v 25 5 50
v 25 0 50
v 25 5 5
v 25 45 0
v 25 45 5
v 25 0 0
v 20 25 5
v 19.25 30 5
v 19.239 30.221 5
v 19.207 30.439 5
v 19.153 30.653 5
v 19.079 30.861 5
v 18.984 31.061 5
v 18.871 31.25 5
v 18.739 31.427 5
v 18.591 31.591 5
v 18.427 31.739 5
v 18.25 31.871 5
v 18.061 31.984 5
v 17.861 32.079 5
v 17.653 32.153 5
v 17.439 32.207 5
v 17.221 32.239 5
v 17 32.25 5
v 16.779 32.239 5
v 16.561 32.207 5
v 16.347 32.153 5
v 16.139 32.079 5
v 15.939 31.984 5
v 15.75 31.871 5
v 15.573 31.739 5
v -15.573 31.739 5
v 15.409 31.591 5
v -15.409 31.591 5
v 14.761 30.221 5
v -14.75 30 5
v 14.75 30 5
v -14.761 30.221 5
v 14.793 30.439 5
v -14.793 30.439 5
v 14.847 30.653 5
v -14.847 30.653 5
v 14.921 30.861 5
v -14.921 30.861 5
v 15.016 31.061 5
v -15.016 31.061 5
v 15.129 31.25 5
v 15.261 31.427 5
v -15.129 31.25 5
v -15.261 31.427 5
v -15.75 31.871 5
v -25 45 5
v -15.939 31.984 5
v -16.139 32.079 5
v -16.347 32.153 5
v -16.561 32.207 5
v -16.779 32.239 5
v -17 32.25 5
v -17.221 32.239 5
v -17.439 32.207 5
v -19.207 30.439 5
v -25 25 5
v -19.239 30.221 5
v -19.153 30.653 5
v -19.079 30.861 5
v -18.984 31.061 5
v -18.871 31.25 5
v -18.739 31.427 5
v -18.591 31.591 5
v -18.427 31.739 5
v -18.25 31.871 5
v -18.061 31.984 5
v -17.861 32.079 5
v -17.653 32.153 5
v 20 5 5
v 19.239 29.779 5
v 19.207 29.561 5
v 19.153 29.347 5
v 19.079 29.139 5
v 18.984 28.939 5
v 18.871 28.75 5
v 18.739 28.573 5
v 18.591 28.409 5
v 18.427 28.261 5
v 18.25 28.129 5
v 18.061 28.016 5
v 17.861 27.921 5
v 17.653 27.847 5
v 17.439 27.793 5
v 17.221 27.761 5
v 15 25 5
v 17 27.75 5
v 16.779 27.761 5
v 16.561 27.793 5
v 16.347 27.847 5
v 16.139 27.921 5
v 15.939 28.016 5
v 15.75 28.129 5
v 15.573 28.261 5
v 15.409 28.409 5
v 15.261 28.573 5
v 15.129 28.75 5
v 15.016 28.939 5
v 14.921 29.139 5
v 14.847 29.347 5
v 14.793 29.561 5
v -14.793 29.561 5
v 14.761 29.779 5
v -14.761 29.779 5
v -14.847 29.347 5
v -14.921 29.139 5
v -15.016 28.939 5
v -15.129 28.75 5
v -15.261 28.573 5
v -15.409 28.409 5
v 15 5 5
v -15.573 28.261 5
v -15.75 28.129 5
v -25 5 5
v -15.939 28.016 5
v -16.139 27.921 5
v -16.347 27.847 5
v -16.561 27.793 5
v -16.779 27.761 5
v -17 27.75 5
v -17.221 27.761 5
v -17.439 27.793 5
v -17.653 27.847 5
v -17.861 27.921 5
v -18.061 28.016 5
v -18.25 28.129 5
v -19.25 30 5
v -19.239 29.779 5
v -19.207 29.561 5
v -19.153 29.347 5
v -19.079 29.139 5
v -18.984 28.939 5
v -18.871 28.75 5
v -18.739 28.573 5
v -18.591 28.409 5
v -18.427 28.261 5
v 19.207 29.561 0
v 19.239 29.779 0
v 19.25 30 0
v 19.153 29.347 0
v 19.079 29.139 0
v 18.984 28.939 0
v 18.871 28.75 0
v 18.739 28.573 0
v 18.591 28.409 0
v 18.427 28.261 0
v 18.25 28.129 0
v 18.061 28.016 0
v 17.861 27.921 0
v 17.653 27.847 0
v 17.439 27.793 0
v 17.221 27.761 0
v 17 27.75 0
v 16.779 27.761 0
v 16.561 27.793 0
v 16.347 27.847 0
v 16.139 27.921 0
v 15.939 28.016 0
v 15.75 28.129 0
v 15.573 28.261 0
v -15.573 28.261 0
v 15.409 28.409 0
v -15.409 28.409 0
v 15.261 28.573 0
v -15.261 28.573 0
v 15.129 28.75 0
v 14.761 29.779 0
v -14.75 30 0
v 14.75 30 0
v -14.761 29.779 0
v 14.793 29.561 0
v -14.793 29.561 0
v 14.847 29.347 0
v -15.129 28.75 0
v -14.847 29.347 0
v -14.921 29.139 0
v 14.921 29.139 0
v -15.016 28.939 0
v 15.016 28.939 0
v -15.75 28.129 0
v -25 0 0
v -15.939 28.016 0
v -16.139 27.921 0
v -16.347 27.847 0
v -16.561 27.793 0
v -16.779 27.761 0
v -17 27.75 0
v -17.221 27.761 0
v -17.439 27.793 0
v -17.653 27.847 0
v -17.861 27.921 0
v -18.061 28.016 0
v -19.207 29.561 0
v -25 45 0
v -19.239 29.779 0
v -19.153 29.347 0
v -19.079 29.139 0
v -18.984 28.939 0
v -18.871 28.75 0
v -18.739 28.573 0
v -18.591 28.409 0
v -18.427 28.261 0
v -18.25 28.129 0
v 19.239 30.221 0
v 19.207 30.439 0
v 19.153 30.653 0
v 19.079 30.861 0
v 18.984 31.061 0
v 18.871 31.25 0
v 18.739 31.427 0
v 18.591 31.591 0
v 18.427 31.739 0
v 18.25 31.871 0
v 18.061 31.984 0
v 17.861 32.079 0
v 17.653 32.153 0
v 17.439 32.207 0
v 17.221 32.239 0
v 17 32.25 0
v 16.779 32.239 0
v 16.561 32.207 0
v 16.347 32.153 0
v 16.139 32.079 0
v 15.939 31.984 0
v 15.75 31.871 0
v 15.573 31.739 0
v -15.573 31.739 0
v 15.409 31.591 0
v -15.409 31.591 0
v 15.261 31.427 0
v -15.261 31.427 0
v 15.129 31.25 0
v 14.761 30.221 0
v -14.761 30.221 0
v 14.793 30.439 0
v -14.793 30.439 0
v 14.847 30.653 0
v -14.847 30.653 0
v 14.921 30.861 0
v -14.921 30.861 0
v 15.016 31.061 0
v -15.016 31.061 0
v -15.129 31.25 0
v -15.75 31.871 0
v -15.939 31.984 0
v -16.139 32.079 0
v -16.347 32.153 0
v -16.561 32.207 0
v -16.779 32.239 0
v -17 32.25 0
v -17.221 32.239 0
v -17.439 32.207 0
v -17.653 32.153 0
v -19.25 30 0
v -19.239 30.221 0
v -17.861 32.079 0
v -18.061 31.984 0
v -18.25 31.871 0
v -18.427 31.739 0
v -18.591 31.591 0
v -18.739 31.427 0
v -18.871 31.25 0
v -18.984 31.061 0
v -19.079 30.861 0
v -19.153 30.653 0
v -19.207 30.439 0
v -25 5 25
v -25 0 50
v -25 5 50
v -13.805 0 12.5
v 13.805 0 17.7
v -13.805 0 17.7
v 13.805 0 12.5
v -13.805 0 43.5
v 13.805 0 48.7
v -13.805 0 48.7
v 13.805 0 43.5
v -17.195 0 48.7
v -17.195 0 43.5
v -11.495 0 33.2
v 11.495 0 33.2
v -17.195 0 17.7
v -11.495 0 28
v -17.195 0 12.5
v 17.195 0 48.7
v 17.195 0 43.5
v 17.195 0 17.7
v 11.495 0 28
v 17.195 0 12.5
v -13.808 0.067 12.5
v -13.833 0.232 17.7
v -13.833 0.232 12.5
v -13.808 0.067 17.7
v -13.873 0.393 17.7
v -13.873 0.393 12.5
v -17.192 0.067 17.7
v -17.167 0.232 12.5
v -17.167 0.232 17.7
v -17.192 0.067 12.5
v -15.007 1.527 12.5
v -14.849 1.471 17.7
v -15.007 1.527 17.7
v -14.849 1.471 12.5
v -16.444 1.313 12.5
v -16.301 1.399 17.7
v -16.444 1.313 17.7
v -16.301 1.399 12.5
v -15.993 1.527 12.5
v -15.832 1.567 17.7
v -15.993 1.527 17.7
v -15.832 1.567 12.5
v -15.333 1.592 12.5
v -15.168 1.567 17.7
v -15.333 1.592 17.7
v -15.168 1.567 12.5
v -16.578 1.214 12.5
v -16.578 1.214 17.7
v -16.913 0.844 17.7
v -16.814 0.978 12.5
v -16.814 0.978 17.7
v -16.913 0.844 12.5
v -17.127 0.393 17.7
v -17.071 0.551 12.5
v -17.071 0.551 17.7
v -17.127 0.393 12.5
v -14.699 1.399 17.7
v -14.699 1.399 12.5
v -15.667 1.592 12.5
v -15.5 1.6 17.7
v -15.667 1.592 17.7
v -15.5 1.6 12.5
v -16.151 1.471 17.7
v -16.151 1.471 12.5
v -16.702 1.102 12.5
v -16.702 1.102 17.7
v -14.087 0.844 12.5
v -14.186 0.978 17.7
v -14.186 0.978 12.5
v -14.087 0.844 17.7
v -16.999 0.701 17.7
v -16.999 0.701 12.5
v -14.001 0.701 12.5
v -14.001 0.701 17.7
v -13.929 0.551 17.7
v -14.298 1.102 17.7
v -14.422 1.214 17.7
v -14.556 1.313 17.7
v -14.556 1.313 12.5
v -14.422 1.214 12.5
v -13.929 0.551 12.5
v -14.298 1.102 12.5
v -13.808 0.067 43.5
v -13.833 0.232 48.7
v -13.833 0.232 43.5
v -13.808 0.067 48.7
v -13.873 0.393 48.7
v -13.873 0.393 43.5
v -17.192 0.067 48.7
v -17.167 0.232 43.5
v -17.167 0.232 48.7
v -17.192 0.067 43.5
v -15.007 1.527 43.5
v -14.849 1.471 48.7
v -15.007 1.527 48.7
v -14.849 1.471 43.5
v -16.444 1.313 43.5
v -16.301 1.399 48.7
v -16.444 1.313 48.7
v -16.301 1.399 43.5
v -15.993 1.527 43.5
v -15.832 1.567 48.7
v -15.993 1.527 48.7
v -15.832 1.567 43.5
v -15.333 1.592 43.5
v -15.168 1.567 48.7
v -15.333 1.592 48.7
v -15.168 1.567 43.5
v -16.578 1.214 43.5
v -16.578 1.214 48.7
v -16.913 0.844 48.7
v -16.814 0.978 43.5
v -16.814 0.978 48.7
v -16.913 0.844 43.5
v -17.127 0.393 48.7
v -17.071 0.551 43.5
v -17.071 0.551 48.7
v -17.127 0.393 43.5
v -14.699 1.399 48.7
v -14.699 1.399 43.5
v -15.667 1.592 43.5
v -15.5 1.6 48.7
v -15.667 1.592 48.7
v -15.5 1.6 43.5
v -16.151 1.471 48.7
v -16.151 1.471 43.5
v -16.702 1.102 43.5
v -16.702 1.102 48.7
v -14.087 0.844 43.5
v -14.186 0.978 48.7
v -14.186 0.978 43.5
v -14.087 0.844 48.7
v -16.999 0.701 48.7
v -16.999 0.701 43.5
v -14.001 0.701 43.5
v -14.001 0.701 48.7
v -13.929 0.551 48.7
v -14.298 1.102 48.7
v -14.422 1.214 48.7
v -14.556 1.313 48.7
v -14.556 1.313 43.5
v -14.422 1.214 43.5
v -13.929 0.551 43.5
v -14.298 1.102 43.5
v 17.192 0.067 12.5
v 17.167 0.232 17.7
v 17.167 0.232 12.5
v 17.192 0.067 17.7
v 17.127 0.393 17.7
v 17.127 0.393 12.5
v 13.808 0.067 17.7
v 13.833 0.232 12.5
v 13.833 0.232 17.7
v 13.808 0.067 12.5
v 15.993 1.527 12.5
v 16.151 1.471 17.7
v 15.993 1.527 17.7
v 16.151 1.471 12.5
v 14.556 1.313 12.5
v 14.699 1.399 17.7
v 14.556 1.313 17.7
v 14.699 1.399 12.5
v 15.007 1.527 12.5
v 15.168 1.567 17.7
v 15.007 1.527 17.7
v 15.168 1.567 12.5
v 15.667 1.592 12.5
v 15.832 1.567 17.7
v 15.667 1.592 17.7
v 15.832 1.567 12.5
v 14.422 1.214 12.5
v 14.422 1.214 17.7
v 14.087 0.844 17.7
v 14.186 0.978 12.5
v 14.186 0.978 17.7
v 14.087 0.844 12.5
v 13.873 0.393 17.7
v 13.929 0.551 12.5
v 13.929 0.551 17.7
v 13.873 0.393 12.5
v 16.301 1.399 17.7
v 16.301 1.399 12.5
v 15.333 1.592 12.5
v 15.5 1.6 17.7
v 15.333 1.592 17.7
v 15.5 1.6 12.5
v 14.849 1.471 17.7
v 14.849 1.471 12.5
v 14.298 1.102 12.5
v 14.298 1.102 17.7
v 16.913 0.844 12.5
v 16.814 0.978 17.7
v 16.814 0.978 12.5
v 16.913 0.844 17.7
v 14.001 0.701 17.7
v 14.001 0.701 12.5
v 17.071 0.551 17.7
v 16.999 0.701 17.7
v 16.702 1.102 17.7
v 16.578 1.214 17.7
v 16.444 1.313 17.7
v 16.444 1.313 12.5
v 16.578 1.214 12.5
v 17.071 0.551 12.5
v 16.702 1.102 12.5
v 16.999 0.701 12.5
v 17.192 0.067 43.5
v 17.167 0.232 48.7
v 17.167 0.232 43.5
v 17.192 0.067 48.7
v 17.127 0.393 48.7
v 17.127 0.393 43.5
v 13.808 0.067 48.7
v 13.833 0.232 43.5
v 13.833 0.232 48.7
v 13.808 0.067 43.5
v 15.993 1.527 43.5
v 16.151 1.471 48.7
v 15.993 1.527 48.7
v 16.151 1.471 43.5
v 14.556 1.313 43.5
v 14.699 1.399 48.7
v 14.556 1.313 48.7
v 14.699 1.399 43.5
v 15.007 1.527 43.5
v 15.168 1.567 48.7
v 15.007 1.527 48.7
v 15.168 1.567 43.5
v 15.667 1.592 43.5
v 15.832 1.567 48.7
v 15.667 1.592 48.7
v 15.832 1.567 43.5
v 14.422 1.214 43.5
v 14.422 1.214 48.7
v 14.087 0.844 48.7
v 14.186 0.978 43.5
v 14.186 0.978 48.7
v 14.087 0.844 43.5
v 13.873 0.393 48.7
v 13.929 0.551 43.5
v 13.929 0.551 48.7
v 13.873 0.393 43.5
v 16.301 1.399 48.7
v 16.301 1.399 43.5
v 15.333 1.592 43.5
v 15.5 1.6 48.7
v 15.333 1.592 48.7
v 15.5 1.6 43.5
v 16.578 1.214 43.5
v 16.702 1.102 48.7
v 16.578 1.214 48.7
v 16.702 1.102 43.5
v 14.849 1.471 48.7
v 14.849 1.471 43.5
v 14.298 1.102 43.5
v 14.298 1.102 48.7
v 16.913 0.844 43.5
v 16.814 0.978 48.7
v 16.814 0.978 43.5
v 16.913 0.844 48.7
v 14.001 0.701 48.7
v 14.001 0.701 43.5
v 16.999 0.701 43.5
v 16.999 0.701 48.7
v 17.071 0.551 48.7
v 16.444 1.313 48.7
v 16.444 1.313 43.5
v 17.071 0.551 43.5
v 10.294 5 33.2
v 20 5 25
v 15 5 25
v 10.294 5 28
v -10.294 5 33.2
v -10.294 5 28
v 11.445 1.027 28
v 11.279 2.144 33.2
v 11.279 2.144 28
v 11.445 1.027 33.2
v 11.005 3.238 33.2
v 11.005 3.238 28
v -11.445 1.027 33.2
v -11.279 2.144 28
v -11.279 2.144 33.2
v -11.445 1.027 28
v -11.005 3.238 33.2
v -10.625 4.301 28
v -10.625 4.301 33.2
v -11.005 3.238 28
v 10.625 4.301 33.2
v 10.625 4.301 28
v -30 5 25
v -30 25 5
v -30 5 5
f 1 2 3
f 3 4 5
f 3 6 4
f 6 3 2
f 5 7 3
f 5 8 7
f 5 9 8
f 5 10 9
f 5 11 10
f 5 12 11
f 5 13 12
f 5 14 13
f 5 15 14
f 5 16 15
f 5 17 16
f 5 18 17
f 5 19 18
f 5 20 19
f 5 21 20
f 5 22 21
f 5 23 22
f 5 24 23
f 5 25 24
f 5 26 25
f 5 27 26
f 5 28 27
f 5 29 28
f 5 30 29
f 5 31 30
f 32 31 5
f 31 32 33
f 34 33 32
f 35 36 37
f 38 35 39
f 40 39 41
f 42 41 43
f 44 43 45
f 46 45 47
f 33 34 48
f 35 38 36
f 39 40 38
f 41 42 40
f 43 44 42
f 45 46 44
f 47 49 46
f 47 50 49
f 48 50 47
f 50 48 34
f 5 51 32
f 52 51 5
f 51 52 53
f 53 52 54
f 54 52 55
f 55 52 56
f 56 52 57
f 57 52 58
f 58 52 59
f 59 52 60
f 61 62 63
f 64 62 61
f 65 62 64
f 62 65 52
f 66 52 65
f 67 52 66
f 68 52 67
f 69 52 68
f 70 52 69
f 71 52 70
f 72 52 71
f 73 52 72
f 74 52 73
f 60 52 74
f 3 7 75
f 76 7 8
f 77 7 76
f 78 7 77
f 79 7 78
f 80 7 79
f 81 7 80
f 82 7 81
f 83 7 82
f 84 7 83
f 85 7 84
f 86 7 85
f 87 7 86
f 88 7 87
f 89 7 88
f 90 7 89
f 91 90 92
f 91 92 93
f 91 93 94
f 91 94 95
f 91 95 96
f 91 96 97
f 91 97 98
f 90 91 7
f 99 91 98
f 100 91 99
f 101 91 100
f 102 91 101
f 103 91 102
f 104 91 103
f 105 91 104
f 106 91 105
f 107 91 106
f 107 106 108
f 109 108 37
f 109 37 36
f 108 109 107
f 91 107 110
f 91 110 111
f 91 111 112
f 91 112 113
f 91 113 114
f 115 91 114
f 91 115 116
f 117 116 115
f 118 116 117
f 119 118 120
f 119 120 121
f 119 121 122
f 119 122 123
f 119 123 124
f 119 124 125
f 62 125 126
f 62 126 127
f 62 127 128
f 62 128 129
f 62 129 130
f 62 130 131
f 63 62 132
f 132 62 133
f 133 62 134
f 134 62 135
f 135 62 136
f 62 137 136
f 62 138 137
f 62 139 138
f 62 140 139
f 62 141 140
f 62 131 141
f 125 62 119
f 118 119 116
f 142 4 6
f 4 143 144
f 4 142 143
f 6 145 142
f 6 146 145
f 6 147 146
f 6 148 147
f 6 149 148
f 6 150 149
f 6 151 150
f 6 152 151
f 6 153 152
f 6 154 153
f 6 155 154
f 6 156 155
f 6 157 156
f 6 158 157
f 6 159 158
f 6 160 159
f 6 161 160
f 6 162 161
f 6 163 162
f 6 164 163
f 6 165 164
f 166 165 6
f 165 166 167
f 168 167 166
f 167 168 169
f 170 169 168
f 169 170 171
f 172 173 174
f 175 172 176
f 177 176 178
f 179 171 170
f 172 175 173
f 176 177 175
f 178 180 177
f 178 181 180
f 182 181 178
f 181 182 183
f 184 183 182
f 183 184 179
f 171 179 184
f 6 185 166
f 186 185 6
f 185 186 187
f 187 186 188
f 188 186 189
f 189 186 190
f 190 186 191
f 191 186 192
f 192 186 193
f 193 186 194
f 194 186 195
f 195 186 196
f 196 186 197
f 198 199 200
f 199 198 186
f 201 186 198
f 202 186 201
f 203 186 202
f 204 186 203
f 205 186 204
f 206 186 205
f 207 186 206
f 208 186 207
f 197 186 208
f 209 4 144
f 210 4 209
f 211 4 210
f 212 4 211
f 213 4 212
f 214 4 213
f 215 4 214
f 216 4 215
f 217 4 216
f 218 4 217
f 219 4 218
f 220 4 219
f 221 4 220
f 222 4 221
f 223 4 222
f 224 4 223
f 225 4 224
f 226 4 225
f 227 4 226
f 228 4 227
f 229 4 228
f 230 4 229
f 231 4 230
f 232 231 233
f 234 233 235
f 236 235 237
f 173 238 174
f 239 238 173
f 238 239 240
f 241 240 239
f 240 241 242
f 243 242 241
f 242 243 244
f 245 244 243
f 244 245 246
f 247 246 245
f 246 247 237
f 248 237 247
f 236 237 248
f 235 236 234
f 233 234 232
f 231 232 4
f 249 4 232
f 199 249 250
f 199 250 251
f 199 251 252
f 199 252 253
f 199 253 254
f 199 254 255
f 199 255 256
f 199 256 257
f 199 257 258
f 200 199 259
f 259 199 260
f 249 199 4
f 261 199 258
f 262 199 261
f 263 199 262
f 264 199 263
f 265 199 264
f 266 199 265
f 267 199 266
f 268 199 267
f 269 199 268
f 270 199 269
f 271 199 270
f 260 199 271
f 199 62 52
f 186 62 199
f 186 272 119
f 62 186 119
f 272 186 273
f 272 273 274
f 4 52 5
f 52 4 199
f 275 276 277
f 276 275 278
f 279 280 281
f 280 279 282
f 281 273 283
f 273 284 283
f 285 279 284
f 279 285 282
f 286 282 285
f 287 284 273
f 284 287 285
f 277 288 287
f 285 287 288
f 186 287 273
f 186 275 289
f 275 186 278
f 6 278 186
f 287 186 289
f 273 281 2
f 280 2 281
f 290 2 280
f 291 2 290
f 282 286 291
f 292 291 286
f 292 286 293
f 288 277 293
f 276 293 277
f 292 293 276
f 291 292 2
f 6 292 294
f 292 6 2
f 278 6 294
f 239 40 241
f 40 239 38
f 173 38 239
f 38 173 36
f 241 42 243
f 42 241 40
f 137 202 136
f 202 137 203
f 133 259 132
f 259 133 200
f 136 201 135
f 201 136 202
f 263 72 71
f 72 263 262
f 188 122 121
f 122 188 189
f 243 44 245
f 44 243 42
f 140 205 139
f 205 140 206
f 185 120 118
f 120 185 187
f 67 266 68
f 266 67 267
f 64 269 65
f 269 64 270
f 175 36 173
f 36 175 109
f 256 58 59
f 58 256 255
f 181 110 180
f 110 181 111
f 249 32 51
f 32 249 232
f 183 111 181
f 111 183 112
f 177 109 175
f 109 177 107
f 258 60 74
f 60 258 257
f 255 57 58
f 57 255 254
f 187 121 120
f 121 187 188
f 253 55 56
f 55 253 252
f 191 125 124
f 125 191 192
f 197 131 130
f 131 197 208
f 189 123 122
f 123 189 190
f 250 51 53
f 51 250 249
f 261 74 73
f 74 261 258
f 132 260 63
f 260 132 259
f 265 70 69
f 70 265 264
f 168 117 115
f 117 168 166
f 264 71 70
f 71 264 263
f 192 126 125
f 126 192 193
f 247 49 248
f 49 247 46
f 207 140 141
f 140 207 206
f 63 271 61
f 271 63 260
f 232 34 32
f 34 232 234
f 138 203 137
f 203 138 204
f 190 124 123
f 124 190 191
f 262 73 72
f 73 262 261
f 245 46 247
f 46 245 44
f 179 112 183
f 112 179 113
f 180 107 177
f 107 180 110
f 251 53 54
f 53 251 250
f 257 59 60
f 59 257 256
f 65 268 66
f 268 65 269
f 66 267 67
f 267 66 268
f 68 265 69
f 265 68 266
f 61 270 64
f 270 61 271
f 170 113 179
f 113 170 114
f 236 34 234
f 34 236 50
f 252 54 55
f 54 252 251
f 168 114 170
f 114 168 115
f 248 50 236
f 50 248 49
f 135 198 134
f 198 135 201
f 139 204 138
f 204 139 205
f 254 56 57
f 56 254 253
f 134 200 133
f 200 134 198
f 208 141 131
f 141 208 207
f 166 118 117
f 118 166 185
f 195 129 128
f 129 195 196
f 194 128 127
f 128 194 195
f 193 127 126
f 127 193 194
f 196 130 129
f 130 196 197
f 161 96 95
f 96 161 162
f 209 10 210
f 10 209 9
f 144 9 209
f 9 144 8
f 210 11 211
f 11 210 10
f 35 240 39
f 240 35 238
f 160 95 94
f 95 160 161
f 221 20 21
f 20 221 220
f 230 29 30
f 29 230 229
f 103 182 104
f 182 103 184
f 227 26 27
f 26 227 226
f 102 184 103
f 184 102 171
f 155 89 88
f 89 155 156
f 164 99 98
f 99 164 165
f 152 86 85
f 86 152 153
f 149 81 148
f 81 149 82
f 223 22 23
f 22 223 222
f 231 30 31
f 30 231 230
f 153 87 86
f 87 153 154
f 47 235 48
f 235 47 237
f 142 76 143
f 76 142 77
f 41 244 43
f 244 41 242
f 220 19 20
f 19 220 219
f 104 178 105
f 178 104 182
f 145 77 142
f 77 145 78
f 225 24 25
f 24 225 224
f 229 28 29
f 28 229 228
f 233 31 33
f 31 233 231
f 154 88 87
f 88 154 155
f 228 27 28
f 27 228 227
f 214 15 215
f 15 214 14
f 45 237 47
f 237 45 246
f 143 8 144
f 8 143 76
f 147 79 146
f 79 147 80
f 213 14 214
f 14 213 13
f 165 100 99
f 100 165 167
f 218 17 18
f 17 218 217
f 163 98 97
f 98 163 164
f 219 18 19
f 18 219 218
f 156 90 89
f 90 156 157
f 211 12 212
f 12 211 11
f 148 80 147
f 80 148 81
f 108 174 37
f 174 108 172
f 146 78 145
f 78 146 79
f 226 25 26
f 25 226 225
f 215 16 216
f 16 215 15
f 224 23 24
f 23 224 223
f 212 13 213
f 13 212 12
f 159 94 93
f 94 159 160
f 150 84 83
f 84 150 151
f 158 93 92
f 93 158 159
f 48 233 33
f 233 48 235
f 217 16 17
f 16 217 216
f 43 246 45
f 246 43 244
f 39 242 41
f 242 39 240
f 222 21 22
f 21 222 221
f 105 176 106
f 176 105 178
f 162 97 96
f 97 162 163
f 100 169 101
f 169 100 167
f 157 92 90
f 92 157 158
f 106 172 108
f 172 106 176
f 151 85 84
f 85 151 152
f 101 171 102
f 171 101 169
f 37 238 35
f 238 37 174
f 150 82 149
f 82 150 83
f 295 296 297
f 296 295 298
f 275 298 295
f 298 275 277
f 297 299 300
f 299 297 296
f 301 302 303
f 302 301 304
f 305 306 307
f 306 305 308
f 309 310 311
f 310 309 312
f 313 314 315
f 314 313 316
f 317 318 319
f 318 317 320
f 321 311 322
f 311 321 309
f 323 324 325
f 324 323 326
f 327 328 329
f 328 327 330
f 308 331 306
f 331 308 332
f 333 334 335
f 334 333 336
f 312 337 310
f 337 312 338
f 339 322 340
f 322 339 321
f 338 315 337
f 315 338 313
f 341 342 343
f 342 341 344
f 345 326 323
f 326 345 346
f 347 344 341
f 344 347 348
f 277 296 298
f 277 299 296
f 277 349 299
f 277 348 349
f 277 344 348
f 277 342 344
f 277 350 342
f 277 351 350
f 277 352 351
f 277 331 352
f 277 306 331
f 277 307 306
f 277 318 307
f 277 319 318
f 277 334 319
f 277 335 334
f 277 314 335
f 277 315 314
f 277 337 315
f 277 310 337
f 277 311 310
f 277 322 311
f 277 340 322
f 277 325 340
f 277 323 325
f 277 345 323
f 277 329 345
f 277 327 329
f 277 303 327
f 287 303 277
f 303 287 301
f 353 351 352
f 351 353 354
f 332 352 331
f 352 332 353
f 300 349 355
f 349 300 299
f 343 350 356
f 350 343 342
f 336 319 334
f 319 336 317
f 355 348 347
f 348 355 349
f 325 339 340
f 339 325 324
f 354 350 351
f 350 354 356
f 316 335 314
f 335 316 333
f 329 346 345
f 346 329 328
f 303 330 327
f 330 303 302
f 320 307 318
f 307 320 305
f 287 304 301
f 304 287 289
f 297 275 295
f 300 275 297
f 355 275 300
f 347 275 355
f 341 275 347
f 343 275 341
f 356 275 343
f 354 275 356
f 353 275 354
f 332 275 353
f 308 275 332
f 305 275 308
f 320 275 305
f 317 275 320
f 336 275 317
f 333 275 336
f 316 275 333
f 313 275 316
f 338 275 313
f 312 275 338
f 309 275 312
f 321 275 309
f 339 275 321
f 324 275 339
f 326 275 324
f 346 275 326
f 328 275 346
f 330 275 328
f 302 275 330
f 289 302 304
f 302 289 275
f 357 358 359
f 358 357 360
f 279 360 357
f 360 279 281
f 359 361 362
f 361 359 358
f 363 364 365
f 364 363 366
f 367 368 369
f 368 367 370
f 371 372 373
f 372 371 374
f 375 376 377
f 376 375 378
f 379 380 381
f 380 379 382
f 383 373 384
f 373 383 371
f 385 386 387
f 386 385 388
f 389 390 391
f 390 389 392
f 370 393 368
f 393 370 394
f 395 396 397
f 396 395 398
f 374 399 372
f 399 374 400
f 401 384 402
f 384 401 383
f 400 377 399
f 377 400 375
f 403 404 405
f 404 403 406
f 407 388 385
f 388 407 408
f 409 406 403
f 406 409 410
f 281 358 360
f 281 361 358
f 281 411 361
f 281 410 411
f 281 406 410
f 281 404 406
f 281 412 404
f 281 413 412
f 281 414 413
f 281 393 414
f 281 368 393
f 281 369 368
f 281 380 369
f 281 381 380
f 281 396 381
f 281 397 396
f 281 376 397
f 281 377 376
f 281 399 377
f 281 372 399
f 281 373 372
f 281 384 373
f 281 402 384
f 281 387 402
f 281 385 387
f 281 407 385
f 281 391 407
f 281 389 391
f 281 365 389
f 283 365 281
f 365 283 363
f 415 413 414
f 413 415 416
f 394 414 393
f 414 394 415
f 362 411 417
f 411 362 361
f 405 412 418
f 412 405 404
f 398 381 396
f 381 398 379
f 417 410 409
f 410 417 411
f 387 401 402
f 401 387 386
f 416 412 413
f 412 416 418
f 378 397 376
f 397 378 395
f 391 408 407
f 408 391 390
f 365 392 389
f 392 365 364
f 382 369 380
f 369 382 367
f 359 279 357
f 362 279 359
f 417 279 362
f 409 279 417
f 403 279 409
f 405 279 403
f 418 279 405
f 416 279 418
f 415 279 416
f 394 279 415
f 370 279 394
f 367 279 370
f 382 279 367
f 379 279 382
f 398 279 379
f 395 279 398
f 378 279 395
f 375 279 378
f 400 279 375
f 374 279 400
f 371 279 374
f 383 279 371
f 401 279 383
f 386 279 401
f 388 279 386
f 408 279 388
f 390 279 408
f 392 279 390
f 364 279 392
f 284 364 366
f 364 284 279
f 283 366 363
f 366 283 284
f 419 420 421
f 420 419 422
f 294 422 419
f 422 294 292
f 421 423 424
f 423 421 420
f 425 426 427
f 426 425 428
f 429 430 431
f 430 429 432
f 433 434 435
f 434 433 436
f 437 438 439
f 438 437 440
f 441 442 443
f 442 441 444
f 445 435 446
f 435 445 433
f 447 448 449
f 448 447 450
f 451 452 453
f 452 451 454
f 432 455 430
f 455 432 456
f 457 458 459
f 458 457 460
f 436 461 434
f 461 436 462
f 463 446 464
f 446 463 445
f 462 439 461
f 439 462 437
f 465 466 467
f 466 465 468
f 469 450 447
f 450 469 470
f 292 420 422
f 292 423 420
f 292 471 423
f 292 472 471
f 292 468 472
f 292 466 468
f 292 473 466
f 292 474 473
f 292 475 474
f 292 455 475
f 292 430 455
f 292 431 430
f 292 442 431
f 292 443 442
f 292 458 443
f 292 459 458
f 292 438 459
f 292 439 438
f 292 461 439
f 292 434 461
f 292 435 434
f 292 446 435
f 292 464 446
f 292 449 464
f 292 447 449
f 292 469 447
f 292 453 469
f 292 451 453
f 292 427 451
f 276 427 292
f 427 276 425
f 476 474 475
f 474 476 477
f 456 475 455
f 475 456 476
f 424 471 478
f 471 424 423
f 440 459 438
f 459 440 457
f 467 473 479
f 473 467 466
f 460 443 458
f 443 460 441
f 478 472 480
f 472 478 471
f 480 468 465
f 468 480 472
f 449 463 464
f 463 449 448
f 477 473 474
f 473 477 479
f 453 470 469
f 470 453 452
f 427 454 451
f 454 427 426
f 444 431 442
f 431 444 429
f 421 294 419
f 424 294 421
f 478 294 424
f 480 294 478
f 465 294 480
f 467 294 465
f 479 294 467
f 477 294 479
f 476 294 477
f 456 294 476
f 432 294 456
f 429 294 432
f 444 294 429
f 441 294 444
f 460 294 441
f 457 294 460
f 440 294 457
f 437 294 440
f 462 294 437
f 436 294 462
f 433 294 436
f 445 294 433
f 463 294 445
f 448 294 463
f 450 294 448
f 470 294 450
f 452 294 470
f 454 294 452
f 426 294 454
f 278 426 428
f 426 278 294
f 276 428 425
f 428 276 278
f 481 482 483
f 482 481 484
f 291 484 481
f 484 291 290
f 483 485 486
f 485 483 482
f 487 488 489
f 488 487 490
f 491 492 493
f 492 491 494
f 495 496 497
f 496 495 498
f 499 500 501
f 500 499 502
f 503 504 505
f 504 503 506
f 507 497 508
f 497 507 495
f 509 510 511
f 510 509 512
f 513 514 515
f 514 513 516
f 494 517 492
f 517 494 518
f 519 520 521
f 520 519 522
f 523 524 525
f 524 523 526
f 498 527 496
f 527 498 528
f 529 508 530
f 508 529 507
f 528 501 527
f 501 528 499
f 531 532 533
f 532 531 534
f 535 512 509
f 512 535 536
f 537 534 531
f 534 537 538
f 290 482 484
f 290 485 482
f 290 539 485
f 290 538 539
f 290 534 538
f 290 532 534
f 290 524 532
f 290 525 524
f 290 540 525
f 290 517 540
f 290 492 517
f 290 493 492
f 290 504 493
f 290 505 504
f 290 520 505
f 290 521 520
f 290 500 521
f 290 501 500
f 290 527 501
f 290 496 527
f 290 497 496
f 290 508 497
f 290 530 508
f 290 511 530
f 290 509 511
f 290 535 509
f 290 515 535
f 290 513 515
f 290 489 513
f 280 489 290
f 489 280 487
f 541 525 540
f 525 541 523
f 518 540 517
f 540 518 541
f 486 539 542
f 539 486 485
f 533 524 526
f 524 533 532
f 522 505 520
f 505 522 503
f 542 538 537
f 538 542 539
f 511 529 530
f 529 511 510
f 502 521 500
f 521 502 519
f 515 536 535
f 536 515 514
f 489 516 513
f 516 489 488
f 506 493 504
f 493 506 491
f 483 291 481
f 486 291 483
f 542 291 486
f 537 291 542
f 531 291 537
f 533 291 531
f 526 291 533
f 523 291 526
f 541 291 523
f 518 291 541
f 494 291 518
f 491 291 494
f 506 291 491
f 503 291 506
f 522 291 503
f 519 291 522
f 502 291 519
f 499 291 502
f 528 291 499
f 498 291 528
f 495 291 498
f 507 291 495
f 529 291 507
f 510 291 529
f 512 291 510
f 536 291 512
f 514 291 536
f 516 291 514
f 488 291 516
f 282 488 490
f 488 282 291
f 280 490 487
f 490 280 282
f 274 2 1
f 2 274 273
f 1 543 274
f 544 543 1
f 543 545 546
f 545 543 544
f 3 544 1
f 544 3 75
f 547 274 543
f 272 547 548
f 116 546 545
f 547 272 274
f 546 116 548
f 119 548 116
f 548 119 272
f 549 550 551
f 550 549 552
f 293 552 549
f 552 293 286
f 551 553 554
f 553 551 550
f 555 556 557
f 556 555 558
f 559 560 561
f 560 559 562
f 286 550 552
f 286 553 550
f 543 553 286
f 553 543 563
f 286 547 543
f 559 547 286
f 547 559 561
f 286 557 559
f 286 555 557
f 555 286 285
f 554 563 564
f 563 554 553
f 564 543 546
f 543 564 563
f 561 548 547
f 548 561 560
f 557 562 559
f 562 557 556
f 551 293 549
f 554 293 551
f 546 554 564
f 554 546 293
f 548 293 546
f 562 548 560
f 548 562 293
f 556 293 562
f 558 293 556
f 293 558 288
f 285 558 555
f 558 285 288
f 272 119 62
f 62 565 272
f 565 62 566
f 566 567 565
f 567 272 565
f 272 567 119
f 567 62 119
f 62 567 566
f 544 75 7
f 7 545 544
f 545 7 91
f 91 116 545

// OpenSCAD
// NEMA 17 Stepper Motor L-Bracket for Syringe Pump
// Designed for FDM 3D Printing

// --- Dimensions ---
// Base Plate
base_width_x = 50;           // Total width (-25 to 25)
base_depth_y = 45;           // Total depth (0 to 45)
base_height_z = 5;           // Thickness of base
base_hole_dia = 4.5;         // M4 screw holes
base_hole_x1 = -17;          // X position of hole 1
base_hole_x2 = 17;           // X position of hole 2
base_hole_y = 30;            // Y position of holes

// Vertical Motor Plate
motor_plate_width_x = 50;    // Total width (-25 to 25)
motor_plate_depth_y = 5;     // Thickness of vertical plate
motor_plate_height_z = 50;   // Total height (0 to 50)

// Motor Mounting Features (on Vertical Plate)
boss_hole_dia = 23;          // Centering boss hole diameter
boss_hole_x = 0;             // Center X of boss hole
boss_hole_z = 28;            // Center Z of boss hole
boss_hole_y_offset = 2.5;    // Center of hole in Y (half of plate thickness)

screw_hole_dia = 3.4;        // M3 screw holes
screw_pattern_size = 31;     // Square pattern for M3 screws
screw_offset = screw_pattern_size / 2;

// Gussets
gusset_thickness = 5;        // Thickness of gussets
gusset_leg_y = 20;           // Leg length along Y
gusset_leg_z = 20;           // Leg length along Z
gusset_x_outer = 25;         // Outer X edge
gusset_x_inner = 20;         // Inner X edge

// --- Constants ---
$fn = 64;
eps = 0.1; // Overlap for difference operations

// --- Main Assembly ---

union() {
    // 1. Base Plate
    difference() {
        // Main Body
        translate([-base_width_x/2, 0, 0])
            cube([base_width_x, base_depth_y, base_height_z]);
        
        // M4 Holes (Vertical through holes)
        translate([base_hole_x1, base_hole_y, -eps])
            cylinder(d=base_hole_dia, h=base_height_z + 2*eps);
        translate([base_hole_x2, base_hole_y, -eps])
            cylinder(d=base_hole_dia, h=base_height_z + 2*eps);
    }

    // 2. Vertical Motor Plate
    difference() {
        // Main Body
        translate([-motor_plate_width_x/2, 0, 0])
            cube([motor_plate_width_x, motor_plate_depth_y, motor_plate_height_z]);
        
        // Boss Centering Hole (Cut through Y axis)
        translate([boss_hole_x, -eps, boss_hole_z])
            cylinder(d=boss_hole_dia, h=motor_plate_depth_y + 2*eps);
        
        // M3 Screw Holes (4 holes in square pattern)
        // Pattern is centered on the boss hole
        for (px = [-screw_offset, screw_offset]) {
            for (pz = [-screw_offset, screw_offset]) {
                translate([px, -eps, boss_hole_z + pz])
                    cylinder(d=screw_hole_dia, h=motor_plate_depth_y + 2*eps);
            }
        }
    }

    // 3. Gussets
    // Left Gusset
    translate([-gusset_x_outer, 5, 5])
        rotate([0, -90, 0]) // Rotate to lie in YZ plane
        linear_extrude(gusset_thickness)
            polygon(points=[[0,0], [gusset_leg_y, 0], [0, gusset_leg_z]]);

    // Right Gusset
    translate([gusset_x_inner, 5, 5])
        rotate([0, -90, 0]) // Rotate to lie in YZ plane
        linear_extrude(gusset_thickness)
            polygon(points=[[0,0], [gusset_leg_y, 0], [0, gusset_leg_z]]);
}
